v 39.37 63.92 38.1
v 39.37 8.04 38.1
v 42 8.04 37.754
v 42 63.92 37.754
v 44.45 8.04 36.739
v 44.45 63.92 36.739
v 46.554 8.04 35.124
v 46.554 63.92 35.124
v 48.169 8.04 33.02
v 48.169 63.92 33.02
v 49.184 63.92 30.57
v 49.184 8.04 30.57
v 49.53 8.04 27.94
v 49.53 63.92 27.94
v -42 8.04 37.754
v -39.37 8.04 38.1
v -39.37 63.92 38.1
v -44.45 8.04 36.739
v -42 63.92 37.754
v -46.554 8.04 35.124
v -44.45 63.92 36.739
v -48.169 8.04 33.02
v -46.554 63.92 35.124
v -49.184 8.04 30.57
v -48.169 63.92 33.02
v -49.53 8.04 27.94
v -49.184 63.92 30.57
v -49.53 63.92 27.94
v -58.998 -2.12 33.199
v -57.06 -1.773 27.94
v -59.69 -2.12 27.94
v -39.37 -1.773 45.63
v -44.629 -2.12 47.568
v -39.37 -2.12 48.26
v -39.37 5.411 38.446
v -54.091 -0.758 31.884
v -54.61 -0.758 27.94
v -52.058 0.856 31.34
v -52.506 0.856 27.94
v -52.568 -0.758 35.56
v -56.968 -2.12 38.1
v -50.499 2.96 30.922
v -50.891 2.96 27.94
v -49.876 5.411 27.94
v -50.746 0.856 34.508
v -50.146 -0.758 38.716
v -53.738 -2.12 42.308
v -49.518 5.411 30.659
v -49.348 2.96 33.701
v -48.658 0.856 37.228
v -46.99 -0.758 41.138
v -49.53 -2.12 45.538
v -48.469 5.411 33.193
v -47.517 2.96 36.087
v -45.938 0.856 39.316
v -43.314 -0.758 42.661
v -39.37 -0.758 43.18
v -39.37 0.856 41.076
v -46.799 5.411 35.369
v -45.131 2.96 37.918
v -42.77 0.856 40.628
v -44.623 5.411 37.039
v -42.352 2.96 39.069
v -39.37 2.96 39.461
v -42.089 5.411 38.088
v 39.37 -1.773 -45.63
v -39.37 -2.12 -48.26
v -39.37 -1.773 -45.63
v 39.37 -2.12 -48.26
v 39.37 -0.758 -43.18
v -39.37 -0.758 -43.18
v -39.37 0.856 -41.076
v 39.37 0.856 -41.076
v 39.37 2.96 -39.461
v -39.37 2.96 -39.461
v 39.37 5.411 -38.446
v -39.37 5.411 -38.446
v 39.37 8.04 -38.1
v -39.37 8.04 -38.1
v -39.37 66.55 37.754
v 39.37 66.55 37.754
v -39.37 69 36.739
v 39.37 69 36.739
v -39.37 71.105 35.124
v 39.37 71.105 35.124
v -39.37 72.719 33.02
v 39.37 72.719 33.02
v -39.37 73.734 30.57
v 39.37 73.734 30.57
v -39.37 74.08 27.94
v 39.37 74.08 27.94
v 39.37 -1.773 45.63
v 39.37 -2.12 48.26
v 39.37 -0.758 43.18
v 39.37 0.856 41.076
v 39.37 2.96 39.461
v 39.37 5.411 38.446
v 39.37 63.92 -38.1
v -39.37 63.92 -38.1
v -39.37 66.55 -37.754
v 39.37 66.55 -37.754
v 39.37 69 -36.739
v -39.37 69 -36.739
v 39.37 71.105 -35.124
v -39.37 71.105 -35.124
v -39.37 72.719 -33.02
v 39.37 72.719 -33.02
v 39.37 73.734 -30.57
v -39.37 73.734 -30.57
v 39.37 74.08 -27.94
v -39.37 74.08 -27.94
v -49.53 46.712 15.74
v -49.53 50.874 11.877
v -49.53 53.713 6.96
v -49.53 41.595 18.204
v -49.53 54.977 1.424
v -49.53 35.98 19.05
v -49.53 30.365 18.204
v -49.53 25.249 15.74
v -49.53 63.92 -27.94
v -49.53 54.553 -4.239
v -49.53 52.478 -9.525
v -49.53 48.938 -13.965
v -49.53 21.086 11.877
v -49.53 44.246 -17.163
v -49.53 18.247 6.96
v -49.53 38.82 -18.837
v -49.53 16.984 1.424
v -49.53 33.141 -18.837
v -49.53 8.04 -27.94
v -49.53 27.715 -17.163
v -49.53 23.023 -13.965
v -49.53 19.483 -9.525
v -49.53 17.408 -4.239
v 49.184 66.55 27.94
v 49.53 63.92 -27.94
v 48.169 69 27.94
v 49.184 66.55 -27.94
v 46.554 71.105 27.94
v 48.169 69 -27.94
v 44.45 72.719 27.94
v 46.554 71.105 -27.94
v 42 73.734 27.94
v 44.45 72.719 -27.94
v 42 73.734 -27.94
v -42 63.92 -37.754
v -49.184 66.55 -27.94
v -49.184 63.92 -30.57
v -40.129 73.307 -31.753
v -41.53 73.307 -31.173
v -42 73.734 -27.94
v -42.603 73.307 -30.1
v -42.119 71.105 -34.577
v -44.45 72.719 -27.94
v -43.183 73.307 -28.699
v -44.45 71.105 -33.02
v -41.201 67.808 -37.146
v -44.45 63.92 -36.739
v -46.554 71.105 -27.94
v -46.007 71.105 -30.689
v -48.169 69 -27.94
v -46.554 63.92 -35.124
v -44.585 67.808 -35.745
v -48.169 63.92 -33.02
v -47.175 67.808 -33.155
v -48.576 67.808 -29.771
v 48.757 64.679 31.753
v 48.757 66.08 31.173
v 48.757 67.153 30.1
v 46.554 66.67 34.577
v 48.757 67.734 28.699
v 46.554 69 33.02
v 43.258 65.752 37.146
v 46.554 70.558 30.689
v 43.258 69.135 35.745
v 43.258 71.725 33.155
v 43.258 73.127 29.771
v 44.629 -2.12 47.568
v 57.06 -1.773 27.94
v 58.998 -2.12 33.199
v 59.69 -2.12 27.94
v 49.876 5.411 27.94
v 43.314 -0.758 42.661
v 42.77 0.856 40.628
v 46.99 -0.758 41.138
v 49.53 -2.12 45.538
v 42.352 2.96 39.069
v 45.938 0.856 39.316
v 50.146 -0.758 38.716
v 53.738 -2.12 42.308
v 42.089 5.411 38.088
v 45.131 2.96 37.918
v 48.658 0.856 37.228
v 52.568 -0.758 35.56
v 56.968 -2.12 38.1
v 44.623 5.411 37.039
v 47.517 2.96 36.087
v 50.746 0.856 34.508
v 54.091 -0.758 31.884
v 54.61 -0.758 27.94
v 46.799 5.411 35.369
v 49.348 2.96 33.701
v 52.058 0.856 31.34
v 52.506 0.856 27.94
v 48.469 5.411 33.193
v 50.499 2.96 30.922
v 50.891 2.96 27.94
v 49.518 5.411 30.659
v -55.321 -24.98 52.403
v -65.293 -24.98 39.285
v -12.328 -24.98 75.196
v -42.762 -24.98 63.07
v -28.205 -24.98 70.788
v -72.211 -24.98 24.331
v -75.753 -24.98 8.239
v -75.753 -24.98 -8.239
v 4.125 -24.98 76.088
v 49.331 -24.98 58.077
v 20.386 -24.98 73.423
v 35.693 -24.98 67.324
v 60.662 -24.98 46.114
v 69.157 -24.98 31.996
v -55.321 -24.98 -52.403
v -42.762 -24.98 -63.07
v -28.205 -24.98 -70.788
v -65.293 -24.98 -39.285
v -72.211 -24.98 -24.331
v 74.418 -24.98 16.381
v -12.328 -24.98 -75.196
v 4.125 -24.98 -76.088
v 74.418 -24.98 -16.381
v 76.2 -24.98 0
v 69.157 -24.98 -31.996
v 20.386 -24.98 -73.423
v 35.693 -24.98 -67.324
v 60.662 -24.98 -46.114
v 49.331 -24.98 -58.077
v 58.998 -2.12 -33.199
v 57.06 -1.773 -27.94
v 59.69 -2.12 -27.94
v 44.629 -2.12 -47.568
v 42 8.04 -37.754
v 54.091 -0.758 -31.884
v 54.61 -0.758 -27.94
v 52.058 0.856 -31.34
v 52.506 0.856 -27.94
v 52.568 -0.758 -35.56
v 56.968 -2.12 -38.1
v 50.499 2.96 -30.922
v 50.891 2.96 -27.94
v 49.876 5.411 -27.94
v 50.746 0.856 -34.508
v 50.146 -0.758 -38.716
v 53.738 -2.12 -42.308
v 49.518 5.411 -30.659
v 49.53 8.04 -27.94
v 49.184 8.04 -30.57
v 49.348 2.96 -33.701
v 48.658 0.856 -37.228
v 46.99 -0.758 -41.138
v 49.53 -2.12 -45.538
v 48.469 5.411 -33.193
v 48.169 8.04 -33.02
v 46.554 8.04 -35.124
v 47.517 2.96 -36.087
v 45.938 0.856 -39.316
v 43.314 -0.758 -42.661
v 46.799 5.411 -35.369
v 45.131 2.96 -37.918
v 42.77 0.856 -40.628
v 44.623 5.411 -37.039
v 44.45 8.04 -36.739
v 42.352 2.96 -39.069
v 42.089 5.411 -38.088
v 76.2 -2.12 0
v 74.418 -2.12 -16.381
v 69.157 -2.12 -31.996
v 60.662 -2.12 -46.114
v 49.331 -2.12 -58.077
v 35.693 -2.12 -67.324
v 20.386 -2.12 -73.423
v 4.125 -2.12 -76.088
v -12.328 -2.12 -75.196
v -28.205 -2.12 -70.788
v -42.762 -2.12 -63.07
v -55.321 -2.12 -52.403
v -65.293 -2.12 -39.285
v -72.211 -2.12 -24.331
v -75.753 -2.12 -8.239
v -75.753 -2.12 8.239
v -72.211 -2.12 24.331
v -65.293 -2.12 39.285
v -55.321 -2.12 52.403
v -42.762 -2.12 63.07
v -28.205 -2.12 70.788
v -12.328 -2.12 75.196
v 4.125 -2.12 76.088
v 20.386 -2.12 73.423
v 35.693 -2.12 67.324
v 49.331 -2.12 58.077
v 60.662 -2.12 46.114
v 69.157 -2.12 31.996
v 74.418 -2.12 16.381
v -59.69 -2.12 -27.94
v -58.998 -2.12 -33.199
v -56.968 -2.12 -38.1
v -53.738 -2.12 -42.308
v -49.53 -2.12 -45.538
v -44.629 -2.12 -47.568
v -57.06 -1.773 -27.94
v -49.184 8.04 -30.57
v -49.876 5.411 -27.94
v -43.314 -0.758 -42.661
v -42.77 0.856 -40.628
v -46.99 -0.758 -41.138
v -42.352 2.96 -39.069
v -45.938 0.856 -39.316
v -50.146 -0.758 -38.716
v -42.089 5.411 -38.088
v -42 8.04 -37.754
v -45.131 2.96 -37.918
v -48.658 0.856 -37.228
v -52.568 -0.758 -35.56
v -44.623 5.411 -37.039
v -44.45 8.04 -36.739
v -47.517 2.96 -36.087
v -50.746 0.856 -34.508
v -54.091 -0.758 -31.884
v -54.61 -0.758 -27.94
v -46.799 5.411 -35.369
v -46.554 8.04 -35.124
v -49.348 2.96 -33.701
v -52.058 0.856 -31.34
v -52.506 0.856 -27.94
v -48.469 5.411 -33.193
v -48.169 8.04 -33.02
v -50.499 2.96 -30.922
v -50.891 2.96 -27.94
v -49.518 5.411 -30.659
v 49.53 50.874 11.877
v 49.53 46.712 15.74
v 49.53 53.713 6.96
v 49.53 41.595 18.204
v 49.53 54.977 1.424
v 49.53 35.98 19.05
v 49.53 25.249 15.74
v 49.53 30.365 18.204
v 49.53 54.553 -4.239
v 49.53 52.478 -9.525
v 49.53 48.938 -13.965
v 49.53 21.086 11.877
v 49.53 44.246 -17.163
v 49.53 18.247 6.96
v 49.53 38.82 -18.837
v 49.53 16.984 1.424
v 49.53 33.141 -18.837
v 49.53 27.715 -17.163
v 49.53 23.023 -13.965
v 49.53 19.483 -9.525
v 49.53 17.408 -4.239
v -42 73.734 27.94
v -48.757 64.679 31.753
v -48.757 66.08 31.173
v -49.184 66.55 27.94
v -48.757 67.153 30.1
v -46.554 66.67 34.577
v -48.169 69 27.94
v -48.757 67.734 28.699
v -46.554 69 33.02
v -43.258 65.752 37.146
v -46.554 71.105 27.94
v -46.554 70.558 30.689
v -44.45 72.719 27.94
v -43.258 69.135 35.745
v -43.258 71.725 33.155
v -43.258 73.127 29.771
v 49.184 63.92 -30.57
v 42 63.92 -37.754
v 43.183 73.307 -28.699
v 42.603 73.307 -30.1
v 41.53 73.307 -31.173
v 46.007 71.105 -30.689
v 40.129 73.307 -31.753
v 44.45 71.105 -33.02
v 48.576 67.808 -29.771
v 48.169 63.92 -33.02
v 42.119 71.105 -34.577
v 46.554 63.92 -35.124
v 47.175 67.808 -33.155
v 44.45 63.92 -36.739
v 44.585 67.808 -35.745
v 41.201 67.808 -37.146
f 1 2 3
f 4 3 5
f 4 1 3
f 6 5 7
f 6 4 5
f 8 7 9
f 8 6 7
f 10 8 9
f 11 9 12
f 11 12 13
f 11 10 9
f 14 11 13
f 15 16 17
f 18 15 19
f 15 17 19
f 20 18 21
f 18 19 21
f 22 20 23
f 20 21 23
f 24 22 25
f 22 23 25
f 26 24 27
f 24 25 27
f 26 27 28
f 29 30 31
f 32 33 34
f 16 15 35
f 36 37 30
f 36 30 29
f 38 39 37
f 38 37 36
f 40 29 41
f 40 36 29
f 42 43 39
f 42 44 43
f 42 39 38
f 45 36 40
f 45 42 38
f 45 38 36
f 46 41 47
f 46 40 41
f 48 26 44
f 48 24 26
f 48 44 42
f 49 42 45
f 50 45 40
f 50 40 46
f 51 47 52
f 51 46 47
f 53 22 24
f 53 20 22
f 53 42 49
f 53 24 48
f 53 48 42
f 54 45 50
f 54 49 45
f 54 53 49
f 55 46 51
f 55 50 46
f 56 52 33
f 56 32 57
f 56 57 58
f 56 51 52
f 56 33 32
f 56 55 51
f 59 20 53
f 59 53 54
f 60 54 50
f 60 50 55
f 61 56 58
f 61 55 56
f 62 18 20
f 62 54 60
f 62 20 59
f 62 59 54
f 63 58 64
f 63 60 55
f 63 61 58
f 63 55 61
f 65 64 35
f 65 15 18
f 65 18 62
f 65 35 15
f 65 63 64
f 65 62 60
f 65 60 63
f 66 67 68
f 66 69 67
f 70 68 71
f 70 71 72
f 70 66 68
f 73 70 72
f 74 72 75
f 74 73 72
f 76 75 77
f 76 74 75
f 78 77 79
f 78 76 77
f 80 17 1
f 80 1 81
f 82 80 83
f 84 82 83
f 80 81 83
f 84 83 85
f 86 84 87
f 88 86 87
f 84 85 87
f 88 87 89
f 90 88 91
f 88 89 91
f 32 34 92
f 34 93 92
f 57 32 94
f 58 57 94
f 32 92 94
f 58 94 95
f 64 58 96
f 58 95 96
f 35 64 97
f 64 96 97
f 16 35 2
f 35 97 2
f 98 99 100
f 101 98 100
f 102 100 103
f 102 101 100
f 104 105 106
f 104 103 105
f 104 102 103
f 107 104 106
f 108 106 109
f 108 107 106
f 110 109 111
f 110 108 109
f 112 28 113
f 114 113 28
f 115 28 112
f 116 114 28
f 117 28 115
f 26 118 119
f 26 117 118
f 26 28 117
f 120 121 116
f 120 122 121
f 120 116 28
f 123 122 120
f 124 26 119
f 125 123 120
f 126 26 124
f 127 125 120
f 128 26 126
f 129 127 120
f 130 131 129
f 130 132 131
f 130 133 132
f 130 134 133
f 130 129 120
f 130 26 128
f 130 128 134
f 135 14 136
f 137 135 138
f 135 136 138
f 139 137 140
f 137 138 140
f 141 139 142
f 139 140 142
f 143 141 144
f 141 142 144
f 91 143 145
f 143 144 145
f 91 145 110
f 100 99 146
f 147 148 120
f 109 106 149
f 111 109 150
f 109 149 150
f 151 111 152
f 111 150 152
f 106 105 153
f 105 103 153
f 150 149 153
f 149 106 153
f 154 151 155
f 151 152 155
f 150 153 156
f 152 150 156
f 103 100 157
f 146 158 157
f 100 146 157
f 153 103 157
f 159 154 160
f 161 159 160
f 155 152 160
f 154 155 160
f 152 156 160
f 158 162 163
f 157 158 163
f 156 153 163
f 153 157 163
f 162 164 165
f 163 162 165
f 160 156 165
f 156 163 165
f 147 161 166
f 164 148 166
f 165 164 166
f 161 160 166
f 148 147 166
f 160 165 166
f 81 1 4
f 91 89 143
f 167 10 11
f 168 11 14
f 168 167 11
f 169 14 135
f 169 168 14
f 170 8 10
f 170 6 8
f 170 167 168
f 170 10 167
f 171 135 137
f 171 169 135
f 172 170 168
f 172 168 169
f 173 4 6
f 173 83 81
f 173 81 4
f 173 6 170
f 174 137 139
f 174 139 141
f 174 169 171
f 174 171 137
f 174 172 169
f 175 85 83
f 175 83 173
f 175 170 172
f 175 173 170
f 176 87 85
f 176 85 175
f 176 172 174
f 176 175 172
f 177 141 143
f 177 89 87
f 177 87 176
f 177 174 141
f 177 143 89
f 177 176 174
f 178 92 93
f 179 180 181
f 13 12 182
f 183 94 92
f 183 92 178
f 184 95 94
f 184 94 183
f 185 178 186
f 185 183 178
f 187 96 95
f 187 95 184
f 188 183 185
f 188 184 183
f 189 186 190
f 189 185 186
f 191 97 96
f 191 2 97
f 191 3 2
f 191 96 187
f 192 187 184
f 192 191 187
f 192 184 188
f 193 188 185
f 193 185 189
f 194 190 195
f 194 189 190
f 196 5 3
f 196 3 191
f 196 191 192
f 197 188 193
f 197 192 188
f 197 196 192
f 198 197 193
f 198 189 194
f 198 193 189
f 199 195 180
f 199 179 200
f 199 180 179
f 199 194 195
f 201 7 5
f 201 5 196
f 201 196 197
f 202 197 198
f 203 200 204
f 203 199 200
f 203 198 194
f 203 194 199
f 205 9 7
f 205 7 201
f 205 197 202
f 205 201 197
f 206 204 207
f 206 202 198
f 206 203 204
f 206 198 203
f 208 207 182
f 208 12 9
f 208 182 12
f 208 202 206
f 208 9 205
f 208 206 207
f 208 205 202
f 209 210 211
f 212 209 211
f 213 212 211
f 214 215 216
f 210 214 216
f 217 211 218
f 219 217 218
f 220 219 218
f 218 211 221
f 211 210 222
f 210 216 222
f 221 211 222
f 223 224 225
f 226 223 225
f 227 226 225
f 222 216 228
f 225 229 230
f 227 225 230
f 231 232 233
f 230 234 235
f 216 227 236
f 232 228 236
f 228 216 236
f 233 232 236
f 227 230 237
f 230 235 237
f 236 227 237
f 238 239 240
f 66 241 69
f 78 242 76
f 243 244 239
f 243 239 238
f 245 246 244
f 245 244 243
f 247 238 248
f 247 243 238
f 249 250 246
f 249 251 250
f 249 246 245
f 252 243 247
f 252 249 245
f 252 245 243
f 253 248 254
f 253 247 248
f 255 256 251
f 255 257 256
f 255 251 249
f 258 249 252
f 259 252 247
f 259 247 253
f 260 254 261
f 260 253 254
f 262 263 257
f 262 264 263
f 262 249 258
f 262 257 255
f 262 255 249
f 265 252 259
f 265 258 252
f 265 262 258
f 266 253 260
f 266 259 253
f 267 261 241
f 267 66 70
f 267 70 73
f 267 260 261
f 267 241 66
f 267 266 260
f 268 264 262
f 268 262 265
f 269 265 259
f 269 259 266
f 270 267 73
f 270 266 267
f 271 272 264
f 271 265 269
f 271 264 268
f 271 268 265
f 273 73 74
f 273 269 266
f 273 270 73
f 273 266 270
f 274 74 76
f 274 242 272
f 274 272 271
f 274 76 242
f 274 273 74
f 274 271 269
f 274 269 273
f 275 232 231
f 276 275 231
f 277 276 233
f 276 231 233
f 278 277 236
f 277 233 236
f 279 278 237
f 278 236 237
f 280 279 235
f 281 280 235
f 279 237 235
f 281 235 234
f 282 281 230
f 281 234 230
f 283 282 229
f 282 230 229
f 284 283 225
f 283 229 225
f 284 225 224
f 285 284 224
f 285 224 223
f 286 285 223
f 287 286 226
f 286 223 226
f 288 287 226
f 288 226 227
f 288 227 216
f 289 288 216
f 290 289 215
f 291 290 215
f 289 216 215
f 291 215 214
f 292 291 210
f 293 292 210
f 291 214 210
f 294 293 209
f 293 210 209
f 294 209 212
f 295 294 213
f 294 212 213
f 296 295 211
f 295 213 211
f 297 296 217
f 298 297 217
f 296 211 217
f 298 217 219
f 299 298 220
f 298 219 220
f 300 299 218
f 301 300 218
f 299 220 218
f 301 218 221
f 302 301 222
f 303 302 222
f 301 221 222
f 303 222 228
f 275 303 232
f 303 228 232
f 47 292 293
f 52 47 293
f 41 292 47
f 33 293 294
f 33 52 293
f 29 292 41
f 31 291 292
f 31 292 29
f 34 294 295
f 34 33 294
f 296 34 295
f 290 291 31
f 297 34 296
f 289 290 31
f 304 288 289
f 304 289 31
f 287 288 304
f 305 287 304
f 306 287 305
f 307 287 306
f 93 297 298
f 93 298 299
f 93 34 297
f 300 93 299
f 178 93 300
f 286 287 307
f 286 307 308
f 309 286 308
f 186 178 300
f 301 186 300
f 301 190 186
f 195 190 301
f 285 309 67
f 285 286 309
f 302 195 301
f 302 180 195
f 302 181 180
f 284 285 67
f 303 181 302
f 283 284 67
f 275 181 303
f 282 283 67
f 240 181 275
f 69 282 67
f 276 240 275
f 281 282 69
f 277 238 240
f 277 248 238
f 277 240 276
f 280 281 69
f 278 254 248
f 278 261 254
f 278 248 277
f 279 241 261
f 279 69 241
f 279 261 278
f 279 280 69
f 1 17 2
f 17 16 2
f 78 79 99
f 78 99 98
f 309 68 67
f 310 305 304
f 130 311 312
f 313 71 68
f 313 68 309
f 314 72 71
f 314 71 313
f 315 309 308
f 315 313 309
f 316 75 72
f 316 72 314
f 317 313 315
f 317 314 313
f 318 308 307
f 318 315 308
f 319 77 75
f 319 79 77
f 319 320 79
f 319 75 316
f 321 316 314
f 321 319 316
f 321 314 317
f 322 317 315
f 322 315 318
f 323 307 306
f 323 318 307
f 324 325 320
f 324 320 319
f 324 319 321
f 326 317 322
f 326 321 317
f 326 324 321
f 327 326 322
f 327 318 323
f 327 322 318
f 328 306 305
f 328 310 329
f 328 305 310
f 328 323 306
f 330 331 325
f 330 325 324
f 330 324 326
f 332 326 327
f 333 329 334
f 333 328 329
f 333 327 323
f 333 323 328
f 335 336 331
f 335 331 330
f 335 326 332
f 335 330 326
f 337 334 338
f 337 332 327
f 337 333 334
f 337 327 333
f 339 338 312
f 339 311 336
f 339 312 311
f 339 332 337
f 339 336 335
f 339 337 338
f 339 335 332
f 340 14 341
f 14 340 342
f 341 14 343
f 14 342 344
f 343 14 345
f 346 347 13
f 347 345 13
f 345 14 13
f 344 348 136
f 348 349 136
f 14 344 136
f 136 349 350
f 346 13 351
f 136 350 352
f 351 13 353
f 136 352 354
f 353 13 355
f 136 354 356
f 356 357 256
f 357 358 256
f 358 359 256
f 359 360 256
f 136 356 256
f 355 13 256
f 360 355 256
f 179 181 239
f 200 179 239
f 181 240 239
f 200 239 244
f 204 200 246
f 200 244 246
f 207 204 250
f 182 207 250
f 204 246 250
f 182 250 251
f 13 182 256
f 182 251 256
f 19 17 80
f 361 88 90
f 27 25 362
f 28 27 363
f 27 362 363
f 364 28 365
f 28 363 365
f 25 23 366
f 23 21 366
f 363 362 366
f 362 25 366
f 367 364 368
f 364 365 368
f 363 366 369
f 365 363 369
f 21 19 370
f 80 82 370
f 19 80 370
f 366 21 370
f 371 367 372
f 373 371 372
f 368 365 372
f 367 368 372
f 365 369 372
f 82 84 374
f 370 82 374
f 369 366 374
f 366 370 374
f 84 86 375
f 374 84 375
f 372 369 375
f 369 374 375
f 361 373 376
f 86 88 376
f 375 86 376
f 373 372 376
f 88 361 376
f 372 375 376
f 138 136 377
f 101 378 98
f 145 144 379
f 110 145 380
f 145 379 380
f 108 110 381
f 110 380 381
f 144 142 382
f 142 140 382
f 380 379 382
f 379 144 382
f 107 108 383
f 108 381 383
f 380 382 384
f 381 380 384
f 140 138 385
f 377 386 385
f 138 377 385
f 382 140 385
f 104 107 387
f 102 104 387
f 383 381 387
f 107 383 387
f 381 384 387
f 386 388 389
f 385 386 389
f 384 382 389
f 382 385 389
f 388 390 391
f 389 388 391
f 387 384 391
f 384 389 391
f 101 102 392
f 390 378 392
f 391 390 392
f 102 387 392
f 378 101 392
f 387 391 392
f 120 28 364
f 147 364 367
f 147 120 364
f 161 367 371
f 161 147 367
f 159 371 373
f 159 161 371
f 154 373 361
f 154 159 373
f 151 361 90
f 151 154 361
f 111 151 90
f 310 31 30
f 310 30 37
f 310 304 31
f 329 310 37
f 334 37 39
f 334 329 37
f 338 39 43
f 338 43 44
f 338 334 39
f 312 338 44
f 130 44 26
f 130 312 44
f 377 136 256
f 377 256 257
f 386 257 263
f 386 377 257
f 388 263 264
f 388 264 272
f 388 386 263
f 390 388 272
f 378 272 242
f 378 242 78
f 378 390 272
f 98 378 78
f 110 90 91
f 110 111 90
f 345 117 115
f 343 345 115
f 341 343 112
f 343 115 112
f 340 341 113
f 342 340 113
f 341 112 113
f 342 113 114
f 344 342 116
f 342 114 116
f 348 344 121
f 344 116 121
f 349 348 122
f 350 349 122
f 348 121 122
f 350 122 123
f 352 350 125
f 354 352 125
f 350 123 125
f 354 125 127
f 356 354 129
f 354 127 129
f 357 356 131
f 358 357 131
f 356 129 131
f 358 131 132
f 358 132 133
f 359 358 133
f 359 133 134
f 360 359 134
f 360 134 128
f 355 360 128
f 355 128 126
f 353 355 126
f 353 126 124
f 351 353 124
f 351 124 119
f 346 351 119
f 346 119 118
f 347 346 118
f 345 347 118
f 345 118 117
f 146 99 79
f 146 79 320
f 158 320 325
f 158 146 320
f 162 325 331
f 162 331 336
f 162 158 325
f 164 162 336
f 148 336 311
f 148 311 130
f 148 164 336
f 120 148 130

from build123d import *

# Parameters (mm, degrees)
SKETCH1_R               = 25.4
BOSS_EXTRUDE1_DEPTH     = 7.62
SKETCH2_W               = 33.02
SKETCH2_H               = 25.4
BOSS_EXTRUDE2_DEPTH     = 25.4
SKETCH4_R               = 6.35
CUT_EXTRUDE1_DEPTH      = 9.89
CUT_EXTRUDE1_DEPTH_BACK = 42.91
SCALE1_SCALE            = 3
FILLET1_R               = 10.16


with BuildPart() as part:
    # Sketch1 → Boss-Extrude1 (new body)
    with BuildSketch(Plane(origin=(0, 0, 0), x_dir=(1, 0, 0), z_dir=(0, 1, 0))):
        Circle(SKETCH1_R)
    extrude(amount=BOSS_EXTRUDE1_DEPTH)

    # Sketch2 → Boss-Extrude2 (add)
    with BuildSketch(Plane(origin=(0, 7.62, 0), x_dir=(1, 0, 0), z_dir=(0, 1, 0))):
        Rectangle(SKETCH2_W, SKETCH2_H)
    extrude(amount=BOSS_EXTRUDE2_DEPTH)

    # Sketch4 → Cut-Extrude1 (cut, two sides)
    with BuildSketch(Plane.ZY.offset(16.51)) as cut_extrude1_sk:
        with Locations((0, 20.32)):
            Circle(SKETCH4_R)
    extrude(amount=CUT_EXTRUDE1_DEPTH, mode=Mode.SUBTRACT)
    extrude(cut_extrude1_sk.sketch, amount=-CUT_EXTRUDE1_DEPTH_BACK, mode=Mode.SUBTRACT)


with BuildPart() as part_1:
    # Scale1: scaled about (0, 12.489824254, 0)
    add(part.part.scale(SCALE1_SCALE).moved(Location((0, -24.979648508, 0))))

    # Fillet1
    fillet1_edges = [part_1.edges().sort_by_distance(p)[0] for p in [
        (0, 74.080351492, 38.1),
        (49.53, -2.119648508, 0),
        (49.53, 35.980351492, 38.1),
        (0, -2.119648508, -38.1),
        (49.53, 35.980351492, -38.1),
        (-49.53, -2.119648508, 0),
        (-49.53, 35.980351492, -38.1),
        (0, -2.119648508, 38.1),
        (-49.53, 35.980351492, 38.1),
        (49.53, 74.080351492, 0),
        (0, 74.080351492, -38.1),
        (-49.53, 74.080351492, 0),
    ]]
    fillet(fillet1_edges, radius=FILLET1_R)


solid = part_1.part
